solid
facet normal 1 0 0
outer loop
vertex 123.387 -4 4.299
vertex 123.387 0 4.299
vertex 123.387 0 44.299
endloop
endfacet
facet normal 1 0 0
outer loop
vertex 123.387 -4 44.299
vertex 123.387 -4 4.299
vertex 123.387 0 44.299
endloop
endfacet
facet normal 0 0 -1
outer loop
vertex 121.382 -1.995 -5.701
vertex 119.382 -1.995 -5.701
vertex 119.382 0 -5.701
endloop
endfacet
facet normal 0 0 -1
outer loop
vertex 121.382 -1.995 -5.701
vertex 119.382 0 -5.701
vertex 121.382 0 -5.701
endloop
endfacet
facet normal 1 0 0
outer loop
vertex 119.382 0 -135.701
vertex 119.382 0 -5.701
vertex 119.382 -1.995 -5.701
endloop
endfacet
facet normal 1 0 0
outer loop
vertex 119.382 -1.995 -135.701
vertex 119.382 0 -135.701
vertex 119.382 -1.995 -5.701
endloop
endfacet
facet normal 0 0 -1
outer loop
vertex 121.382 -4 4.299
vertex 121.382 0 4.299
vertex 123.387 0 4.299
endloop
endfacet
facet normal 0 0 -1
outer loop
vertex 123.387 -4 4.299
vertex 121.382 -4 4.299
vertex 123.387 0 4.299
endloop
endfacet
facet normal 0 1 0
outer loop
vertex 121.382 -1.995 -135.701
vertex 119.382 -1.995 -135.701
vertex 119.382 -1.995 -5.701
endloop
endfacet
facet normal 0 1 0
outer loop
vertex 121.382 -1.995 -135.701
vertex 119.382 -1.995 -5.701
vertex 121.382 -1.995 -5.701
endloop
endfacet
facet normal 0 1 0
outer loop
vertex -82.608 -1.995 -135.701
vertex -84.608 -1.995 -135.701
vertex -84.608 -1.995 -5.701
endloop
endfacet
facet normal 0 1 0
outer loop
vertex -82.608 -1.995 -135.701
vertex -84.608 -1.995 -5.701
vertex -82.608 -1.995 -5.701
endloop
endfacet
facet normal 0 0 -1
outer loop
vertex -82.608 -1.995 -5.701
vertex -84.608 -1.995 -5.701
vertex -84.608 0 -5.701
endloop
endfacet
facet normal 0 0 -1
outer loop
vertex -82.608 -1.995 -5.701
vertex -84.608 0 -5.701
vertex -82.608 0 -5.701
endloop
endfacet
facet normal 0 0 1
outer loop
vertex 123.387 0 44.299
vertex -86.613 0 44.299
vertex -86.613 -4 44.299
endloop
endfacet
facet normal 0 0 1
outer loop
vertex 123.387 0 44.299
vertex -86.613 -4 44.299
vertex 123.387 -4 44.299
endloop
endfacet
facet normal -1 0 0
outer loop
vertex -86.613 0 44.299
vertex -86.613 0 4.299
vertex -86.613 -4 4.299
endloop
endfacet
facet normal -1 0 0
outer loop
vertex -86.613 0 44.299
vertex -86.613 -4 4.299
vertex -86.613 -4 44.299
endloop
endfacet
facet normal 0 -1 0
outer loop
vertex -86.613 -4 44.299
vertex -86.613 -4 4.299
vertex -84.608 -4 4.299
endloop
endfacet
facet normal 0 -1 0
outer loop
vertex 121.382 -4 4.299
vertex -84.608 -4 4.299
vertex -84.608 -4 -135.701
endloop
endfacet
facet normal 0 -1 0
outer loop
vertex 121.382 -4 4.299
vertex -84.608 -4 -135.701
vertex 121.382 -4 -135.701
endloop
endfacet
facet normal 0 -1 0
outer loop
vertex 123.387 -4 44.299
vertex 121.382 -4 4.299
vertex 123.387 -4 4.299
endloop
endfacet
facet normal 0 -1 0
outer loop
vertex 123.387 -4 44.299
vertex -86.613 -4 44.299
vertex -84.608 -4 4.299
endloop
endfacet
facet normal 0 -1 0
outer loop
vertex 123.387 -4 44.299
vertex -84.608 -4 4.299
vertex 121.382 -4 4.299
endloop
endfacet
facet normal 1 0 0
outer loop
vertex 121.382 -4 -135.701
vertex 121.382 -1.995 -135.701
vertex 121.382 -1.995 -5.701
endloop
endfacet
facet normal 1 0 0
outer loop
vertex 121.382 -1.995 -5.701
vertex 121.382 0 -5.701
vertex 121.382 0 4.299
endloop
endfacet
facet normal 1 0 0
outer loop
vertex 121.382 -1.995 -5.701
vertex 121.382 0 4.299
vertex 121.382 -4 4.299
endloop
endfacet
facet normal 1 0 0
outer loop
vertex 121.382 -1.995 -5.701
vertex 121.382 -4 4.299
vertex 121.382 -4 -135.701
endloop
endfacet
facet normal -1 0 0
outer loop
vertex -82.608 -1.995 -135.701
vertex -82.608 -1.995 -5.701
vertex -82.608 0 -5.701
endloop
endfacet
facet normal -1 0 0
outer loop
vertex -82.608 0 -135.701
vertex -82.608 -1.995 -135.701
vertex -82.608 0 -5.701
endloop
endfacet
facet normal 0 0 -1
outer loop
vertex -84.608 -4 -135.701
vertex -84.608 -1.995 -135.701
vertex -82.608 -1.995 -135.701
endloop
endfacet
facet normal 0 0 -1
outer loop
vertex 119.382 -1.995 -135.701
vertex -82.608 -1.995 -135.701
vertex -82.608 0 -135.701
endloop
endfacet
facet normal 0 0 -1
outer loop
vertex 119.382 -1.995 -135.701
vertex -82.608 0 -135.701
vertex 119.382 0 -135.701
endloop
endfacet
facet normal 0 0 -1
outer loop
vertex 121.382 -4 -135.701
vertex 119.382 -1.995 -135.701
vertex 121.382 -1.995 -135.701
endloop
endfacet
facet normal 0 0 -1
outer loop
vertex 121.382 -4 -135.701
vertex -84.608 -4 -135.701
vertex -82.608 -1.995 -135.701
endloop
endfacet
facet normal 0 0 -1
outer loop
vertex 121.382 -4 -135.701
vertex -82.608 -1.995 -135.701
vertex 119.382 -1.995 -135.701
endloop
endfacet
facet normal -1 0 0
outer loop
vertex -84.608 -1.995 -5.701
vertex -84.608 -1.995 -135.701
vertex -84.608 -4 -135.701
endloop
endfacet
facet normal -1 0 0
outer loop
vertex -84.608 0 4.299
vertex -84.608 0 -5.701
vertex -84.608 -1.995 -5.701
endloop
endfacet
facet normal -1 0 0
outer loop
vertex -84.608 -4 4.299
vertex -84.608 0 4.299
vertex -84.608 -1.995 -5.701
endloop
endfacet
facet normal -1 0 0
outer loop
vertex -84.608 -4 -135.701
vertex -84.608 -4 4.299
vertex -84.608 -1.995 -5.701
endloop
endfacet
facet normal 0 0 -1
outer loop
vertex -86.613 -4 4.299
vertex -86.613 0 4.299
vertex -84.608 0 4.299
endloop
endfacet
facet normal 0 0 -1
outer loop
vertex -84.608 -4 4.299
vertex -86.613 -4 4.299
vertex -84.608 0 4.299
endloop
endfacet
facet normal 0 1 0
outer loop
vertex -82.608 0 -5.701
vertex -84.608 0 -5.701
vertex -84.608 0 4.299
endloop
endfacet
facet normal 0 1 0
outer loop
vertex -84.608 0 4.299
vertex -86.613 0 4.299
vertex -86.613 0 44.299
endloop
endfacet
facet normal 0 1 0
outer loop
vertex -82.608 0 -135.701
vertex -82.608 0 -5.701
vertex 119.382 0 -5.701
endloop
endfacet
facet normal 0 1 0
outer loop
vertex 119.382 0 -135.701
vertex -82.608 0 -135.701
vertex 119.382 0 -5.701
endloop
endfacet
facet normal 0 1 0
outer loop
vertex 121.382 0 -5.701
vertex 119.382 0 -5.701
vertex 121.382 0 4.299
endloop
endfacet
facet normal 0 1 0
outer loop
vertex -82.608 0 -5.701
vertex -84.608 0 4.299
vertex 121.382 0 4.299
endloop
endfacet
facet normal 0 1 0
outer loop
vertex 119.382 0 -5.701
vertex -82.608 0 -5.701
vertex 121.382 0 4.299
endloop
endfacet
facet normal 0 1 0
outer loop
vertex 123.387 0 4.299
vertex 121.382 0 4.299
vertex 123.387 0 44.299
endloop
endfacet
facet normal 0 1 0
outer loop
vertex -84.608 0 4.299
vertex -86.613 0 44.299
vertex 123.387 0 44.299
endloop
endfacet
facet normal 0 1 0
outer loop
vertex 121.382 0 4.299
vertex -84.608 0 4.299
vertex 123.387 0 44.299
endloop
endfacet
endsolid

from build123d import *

# Parameters (mm, degrees)
F0_W     = 210
F0_H     = 40
F1_DEPTH = 4
F2_W     = 2
F2_H     = 2.005
F3_DEPTH = 140
F4_W     = 2
F4_H     = 1.995
F5_DEPTH = 10
F6_W     = 2
F6_H     = 1.995
F7_DEPTH = 10


with BuildPart() as f1:
    # F0 (on Front) → F1 (new body)
    with BuildSketch(Plane.XZ):
        with Locations((18.386809, 24.299242)):
            Rectangle(F0_W, F0_H)
    extrude(amount=F1_DEPTH)

    # F2 (on face) → F3 (join)
    with BuildSketch(Plane(origin=(0, 0, 4.299242), x_dir=(1, 0, 0), z_dir=(0, 0, -1))):
        with Locations((-83.608191, 2.9975)):
            Rectangle(F2_W, F2_H)
        Polygon((-82.608191, 4), (-82.608191, 1.995), (-82.608191, 0), (119.381809, 0), (119.381809, 1.995), (119.381809, 4), align=None)
        with Locations((120.381809, 2.9975)):
            Rectangle(F2_W, F2_H)
    extrude(amount=F3_DEPTH)

    # F4 (on face) → F5 (join)
    with BuildSketch(Plane(origin=(0, 0, 4.299242), x_dir=(1, 0, 0), z_dir=(0, 0, -1))):
        with Locations((120.381809, 0.9975)):
            Rectangle(F4_W, F4_H)
    extrude(amount=F5_DEPTH)

    # F6 (on face) → F7 (join)
    with BuildSketch(Plane(origin=(0, 0, 4.299242), x_dir=(1, 0, 0), z_dir=(0, 0, -1))):
        with Locations((-83.608191, 0.9975)):
            Rectangle(F6_W, F6_H)
    extrude(amount=F7_DEPTH)


solid = f1.part
